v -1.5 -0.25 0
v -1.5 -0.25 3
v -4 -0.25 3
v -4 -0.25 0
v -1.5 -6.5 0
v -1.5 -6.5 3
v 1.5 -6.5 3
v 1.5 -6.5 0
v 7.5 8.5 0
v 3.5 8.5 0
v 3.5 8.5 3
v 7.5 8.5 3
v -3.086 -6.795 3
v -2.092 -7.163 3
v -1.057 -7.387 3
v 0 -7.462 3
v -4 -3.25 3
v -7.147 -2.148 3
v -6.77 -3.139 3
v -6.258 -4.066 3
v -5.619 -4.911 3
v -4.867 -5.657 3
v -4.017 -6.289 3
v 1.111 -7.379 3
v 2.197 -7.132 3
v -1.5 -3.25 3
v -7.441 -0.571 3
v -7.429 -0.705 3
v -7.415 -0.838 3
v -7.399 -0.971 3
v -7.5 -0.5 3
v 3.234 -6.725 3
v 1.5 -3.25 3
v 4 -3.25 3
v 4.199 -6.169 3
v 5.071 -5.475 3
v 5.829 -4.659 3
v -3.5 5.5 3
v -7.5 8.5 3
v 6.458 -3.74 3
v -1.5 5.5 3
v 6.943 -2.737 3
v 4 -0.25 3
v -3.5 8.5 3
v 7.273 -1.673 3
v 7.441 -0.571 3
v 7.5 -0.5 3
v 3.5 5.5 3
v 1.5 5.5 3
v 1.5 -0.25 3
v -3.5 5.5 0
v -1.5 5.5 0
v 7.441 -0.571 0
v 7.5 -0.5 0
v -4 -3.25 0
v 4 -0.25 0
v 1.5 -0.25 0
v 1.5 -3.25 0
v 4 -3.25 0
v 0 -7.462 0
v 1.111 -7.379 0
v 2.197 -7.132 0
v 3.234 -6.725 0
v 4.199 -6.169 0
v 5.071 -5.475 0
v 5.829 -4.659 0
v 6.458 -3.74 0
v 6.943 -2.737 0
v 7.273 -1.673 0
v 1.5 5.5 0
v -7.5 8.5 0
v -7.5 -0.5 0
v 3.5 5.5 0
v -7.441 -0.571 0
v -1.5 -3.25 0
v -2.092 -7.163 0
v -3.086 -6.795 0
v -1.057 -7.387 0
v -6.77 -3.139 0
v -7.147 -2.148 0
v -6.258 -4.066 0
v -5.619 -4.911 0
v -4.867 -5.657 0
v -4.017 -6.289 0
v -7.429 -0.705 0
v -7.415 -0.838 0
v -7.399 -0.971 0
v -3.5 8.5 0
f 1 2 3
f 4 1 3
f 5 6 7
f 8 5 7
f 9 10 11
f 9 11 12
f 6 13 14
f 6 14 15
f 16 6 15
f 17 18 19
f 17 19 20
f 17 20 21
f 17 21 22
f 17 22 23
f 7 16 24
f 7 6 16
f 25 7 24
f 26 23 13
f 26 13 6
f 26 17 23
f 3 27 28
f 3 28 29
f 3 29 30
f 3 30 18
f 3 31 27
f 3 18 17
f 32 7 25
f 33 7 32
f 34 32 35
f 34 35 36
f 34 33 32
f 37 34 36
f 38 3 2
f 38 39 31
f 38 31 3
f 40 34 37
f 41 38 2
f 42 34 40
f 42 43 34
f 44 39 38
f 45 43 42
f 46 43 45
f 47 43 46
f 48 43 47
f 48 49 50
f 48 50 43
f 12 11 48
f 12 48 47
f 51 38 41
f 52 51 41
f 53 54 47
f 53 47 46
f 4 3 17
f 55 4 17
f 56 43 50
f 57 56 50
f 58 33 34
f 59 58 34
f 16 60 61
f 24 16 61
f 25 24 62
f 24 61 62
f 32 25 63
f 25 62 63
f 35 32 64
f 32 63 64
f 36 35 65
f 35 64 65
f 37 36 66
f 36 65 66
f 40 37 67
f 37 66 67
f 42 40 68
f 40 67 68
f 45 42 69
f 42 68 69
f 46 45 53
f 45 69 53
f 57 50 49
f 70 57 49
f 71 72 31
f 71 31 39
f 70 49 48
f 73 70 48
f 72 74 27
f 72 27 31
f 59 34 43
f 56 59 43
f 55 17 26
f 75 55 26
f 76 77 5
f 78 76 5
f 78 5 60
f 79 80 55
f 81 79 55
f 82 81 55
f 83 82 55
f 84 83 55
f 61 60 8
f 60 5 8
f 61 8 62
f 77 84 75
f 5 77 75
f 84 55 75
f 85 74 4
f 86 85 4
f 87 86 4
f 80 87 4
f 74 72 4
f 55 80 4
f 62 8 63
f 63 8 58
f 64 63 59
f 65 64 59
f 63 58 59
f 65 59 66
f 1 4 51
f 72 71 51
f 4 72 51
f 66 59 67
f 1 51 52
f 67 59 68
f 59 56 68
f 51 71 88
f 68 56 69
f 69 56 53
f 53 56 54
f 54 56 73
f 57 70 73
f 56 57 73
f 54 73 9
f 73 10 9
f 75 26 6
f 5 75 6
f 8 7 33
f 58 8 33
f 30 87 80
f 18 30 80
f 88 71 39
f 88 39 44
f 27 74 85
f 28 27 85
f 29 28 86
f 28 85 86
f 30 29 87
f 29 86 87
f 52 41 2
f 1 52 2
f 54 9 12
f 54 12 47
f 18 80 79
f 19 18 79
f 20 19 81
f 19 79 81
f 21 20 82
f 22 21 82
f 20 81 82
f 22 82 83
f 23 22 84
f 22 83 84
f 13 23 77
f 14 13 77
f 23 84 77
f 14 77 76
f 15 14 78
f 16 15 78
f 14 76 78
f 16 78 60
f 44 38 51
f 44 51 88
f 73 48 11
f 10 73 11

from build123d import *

# Parameters (mm, degrees)
SALIENTE_EXTRUIR1_DEPTH = 3
CORTAR_EXTRUIR1_DEPTH   = 10
CROQUIS3_W              = 2
CROQUIS3_H              = 3
CORTAR_EXTRUIR2_DEPTH   = 10
SALIENTE_EXTRUIR2_START = -3
SALIENTE_EXTRUIR2_DEPTH = 3


with BuildPart() as part:
    # Croquis1 → Saliente-Extruir1 (new body)
    with BuildSketch(Plane.XY):
        with BuildLine():
            Line((-7.5, -0.5), (-7.5, 8.5))
            Line((-7.5, 8.5), (7.5, 8.5))
            Line((7.5, 8.5), (7.5, -0.5))
            Line((7.5, -0.5), (5, -3.5))
            Line((5, -3.5), (3, -4.462410552))
            ThreePointArc((3, -4.462410552), (0, -7.462410552), (-3, -4.462410552))
            Line((-3, -4.462410552), (-5, -3.5))
            Line((-5, -3.5), (-7.5, -0.5))
        make_face()
    extrude(amount=SALIENTE_EXTRUIR1_DEPTH)

    # Croquis2 → Cortar-Extruir1 (cut)
    with BuildSketch(Plane.XY.offset(3)):
        Polygon((1.5, 8.5), (-1.5, 8.5), (-1.5, -0.25), (-4, -0.25), (-4, -3.25), (-1.5, -3.25), (-1.5, -6.5), (1.5, -6.5), (1.5, -3.25), (4, -3.25), (4, -0.25), (1.5, -0.25), align=None)
    extrude(amount=-CORTAR_EXTRUIR1_DEPTH, mode=Mode.SUBTRACT)

    # Croquis3 → Cortar-Extruir2 (cut)
    with BuildSketch(Plane.XY.offset(3)):
        with Locations((-2.5, 7)):
            Rectangle(CROQUIS3_W, CROQUIS3_H)
        with Locations((2.5, 7)):
            Rectangle(CROQUIS3_W, CROQUIS3_H)
    extrude(amount=-CORTAR_EXTRUIR2_DEPTH, mode=Mode.SUBTRACT)

    # Croquis5 → Saliente-Extruir2 (add)
    with BuildSketch(Plane.XY.offset(3).offset(SALIENTE_EXTRUIR2_START)):
        with BuildLine():
            ThreePointArc((-7.440502446, -0.571397065), (-7.422411846, -0.771604582), (-7.39893509, -0.971252175))
            Line((-7.39893509, -0.971252175), (-7.146532031, -2.148173916))
            ThreePointArc((-7.146532031, -2.148173916), (-4.452921263, -5.988243772), (0, -7.462410552))
            ThreePointArc((0, -7.462410552), (-2.121320344, -6.583730896), (-3, -4.462410552))
            Line((-3, -4.462410552), (-5, -3.5))
            Line((-5, -3.5), (-7.440502446, -0.571397065))
        make_face()
        with BuildLine():
            ThreePointArc((3, -4.462410552), (2.121320344, -6.583730896), (0, -7.462410552))
            ThreePointArc((0, -7.462410552), (5.070679035, -5.475014646), (7.440502446, -0.571397065))
            Line((7.440502446, -0.571397065), (5, -3.5))
            Line((5, -3.5), (3, -4.462410552))
        make_face()
    extrude(amount=SALIENTE_EXTRUIR2_DEPTH)


solid = part.part
